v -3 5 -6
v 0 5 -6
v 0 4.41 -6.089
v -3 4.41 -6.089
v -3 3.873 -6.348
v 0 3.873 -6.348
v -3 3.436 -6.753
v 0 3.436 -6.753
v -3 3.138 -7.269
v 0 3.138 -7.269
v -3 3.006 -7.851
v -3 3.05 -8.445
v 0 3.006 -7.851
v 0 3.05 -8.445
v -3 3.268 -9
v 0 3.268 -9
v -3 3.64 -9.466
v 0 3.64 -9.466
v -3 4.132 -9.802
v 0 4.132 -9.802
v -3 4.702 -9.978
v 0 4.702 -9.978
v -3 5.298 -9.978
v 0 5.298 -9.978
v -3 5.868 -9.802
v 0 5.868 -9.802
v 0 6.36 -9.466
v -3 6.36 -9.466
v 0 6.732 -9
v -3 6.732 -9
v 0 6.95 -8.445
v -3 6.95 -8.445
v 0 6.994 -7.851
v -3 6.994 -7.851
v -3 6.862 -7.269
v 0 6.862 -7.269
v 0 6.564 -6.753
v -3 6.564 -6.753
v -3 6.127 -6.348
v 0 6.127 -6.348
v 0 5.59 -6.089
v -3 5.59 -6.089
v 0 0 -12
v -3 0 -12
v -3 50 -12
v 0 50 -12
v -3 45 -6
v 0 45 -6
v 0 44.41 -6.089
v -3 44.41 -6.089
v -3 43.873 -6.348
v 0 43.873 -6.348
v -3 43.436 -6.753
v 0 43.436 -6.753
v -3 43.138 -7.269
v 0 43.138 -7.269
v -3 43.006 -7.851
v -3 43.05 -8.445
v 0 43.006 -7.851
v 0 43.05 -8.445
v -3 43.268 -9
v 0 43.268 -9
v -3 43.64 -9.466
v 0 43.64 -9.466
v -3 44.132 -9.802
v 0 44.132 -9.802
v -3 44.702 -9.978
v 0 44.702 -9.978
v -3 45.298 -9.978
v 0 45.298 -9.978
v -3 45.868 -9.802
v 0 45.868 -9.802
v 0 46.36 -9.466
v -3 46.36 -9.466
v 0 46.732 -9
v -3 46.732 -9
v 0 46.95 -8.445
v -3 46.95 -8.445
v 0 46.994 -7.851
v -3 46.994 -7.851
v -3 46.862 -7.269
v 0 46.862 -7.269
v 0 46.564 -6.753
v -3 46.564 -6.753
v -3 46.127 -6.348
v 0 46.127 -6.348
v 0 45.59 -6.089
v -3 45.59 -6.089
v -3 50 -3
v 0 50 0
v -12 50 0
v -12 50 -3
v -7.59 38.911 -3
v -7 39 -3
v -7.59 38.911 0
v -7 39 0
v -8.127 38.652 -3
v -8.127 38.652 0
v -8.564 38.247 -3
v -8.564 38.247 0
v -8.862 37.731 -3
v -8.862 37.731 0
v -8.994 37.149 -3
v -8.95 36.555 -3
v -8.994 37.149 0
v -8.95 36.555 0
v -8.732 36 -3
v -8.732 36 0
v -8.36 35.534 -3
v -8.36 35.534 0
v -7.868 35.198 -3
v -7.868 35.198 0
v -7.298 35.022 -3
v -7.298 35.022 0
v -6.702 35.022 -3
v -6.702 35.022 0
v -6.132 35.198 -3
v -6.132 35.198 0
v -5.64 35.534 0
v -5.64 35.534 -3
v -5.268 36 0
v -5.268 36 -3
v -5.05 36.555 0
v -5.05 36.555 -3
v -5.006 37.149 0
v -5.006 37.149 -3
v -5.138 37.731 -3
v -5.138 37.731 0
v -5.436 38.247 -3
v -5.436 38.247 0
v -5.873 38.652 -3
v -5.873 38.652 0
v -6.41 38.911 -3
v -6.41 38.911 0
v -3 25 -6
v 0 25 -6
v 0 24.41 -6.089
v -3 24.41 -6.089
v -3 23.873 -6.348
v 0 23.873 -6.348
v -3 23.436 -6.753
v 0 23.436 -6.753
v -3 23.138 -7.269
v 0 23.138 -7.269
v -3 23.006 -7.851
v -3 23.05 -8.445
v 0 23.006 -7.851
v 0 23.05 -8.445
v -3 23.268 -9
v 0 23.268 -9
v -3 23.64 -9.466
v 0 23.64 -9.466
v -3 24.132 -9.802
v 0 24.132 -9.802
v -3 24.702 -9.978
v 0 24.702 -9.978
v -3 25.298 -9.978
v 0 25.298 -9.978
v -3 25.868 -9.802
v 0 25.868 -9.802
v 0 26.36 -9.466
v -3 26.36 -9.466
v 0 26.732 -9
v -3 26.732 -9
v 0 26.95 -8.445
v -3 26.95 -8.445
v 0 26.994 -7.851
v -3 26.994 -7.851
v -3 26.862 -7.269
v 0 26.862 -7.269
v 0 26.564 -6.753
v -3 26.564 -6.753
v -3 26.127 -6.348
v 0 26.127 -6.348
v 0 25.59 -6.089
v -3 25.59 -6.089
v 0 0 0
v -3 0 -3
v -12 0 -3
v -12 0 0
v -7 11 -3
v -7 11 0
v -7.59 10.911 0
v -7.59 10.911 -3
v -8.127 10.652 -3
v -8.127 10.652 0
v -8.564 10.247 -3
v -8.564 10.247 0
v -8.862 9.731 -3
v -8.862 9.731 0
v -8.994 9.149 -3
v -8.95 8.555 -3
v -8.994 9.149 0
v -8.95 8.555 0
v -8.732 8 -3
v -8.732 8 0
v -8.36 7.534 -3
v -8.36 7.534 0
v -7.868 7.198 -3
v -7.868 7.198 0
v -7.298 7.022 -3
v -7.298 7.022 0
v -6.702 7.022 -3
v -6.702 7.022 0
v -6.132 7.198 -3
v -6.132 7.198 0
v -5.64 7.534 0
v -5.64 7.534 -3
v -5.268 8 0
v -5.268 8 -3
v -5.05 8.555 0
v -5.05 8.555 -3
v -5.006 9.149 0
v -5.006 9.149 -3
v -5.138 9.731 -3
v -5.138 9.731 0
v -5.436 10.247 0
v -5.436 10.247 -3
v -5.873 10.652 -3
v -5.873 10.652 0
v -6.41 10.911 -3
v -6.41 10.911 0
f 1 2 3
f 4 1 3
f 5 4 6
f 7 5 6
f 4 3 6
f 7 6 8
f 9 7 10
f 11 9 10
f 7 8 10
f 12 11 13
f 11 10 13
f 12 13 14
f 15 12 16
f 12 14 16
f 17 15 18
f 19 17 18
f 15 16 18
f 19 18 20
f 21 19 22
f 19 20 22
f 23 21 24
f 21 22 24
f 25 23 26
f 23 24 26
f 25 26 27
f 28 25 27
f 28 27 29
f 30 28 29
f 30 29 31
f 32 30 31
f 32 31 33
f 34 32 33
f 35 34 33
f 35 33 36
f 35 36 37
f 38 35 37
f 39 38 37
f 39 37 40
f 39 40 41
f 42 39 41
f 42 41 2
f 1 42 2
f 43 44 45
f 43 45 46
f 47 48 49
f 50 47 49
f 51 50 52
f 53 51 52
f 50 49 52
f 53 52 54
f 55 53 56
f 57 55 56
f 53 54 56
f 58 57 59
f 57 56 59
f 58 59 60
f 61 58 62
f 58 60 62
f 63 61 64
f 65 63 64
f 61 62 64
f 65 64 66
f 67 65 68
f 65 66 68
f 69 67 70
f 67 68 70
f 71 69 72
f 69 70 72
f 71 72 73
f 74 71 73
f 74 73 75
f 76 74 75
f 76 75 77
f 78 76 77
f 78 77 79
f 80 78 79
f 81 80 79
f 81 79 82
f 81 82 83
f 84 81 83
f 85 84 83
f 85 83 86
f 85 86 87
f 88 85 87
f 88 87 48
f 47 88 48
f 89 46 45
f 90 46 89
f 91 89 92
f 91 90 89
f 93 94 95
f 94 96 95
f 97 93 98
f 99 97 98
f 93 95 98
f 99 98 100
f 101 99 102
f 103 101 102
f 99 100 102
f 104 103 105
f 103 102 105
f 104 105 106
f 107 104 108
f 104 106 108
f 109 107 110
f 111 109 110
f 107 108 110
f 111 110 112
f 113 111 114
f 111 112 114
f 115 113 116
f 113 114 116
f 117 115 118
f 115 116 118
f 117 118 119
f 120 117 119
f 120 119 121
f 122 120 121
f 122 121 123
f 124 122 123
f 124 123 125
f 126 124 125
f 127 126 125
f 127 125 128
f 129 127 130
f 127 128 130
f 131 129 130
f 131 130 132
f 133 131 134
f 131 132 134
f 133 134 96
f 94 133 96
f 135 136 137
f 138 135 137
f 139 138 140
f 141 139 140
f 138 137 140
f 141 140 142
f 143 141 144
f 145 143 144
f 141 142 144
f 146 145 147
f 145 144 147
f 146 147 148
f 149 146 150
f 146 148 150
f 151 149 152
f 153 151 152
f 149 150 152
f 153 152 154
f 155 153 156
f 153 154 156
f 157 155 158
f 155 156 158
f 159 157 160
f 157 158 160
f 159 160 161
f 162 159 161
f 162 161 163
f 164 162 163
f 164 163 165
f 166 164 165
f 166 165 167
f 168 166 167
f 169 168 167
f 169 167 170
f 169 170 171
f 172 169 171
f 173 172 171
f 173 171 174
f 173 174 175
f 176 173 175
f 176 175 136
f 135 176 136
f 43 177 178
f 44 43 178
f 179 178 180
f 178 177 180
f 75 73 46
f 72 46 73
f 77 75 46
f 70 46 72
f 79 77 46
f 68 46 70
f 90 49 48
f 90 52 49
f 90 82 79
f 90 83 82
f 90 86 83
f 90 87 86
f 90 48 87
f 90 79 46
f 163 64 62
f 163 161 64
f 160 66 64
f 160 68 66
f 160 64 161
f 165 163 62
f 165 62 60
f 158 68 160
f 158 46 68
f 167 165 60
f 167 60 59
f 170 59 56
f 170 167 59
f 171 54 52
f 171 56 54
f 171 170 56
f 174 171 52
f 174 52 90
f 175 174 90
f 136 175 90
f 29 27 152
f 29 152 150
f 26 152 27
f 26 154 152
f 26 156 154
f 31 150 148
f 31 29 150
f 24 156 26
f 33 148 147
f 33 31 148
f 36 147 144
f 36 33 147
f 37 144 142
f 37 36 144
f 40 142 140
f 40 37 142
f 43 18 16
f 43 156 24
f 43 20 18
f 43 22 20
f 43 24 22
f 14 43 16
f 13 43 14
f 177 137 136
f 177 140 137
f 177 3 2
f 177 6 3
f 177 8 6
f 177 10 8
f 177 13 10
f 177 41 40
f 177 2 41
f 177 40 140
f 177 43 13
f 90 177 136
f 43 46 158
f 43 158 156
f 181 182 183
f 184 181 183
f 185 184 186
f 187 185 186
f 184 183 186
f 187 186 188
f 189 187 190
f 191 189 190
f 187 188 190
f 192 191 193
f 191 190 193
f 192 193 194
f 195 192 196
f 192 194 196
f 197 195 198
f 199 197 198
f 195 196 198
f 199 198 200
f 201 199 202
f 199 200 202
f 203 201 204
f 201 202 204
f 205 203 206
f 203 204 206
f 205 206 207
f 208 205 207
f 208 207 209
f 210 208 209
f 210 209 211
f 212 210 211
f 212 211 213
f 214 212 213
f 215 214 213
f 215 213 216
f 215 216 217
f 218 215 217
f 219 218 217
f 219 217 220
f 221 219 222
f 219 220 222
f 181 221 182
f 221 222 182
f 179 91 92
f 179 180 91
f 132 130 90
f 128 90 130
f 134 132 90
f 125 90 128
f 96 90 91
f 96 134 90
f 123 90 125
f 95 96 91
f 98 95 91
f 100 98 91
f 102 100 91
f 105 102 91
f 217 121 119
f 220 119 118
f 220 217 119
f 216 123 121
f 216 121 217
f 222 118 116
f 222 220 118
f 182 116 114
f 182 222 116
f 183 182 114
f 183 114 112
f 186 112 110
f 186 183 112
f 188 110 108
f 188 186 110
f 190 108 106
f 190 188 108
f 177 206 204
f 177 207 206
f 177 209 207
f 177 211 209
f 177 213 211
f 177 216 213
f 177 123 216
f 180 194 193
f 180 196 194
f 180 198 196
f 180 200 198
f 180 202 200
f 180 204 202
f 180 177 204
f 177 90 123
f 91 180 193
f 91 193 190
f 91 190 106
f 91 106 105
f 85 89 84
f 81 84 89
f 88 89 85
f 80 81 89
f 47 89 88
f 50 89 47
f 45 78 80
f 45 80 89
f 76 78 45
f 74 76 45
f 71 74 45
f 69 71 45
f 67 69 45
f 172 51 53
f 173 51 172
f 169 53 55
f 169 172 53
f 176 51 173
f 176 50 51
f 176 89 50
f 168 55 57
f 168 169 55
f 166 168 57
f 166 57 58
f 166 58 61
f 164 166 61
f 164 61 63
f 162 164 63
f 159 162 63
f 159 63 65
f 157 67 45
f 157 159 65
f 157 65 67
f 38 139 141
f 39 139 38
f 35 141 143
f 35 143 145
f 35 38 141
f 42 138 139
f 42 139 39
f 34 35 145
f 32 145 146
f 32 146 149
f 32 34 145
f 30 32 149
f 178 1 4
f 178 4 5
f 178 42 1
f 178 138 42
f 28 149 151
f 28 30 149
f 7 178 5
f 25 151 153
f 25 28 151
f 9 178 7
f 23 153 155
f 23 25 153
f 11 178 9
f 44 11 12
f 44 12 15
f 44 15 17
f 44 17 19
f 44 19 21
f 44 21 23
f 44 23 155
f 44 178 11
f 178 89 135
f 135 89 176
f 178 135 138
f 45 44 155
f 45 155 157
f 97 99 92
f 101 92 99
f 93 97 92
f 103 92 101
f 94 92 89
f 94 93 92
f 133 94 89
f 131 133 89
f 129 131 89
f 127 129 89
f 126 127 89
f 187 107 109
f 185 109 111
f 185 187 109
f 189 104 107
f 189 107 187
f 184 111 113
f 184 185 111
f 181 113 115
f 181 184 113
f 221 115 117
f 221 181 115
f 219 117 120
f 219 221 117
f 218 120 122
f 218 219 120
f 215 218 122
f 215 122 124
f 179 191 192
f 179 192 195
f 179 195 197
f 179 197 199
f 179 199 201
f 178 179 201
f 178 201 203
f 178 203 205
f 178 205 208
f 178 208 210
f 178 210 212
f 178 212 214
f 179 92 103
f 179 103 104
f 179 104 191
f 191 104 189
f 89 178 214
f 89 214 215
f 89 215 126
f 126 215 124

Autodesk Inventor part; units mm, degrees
ref_plane "YZ Plane" through (0, 0, 0) normal (1, 0, 0) x (0, 1, 0)
ref_plane "XZ Plane" through (0, 0, 0) normal (0, 1, 0) x (-1, 0, 0)
ref_plane "XY Plane" through (0, 0, 0) normal (0, 0, 1) x (1, 0, 0)
sketch "Skizze1" plane through (0, 0, 0) normal (0, 1, 0) x (-1, 0, 0)
  line L0 (0, 0) -> (12, 0)
  line L1 (12, 0) -> (12, -3)
  line L2 (12, -3) -> (3, -3)
  line L3 (3, -3) -> (3, -12)
  line L4 (3, -12) -> (0, -12)
  line L5 (0, -12) -> (0, 0)
  dimension "d0" = 12
  dimension "d1" = 3
  dimension "d2" = 12
  dimension "d3" = 3
extrude "Extrusion1" add sketch "Skizze1" along normal blind 50
sketch "Skizze2" plane through (-3, 0, -12) normal (-1, 0, 0) x (0, 0, 1)
  line L0 (0, 0) -> (0, 50) projected
  line L1 (12, 0) -> (0, 0) projected
  line L2 (0, 50) -> (9, 50) projected
  point P0 (4, 45)
  point P1 (4, 5)
  point P2 (0, 25)
  point P3 (4, 25)
  dimension "d13" = 4
  dimension "d29" = 5
  dimension "d30" = 5
  dimension "d31" = 20
hole "Bohrung1" at (-3, 45, -8) at (-3, 5, -8) at (-3, 25, -8) direction (1, 0, 0) diameter 4 end through all
sketch "Skizze3" plane through (-3, 0, -3) normal (0, 0, -1) x (-1, 0, 0)
  line L0 (0, 0) -> (9, 0) projected
  line L1 (0, 50) -> (9, 50) projected
  line L2 (9, 0) -> (9, 50) projected
  point P0 (-3, 0)
  point P1 (4, 9)
  point P2 (4, 37)
  point P3 (4.5, 0)
  point P4 (9, 25)
  dimension "d26" = 28
  dimension "d28" = 5
  dimension "d32" = 9
hole "Bohrung2" at (-7, 9, -3) at (-7, 37, -3) direction (0, 0, 1) diameter 4 end through all
properties part number "1172" material "Aluminium 6061"
